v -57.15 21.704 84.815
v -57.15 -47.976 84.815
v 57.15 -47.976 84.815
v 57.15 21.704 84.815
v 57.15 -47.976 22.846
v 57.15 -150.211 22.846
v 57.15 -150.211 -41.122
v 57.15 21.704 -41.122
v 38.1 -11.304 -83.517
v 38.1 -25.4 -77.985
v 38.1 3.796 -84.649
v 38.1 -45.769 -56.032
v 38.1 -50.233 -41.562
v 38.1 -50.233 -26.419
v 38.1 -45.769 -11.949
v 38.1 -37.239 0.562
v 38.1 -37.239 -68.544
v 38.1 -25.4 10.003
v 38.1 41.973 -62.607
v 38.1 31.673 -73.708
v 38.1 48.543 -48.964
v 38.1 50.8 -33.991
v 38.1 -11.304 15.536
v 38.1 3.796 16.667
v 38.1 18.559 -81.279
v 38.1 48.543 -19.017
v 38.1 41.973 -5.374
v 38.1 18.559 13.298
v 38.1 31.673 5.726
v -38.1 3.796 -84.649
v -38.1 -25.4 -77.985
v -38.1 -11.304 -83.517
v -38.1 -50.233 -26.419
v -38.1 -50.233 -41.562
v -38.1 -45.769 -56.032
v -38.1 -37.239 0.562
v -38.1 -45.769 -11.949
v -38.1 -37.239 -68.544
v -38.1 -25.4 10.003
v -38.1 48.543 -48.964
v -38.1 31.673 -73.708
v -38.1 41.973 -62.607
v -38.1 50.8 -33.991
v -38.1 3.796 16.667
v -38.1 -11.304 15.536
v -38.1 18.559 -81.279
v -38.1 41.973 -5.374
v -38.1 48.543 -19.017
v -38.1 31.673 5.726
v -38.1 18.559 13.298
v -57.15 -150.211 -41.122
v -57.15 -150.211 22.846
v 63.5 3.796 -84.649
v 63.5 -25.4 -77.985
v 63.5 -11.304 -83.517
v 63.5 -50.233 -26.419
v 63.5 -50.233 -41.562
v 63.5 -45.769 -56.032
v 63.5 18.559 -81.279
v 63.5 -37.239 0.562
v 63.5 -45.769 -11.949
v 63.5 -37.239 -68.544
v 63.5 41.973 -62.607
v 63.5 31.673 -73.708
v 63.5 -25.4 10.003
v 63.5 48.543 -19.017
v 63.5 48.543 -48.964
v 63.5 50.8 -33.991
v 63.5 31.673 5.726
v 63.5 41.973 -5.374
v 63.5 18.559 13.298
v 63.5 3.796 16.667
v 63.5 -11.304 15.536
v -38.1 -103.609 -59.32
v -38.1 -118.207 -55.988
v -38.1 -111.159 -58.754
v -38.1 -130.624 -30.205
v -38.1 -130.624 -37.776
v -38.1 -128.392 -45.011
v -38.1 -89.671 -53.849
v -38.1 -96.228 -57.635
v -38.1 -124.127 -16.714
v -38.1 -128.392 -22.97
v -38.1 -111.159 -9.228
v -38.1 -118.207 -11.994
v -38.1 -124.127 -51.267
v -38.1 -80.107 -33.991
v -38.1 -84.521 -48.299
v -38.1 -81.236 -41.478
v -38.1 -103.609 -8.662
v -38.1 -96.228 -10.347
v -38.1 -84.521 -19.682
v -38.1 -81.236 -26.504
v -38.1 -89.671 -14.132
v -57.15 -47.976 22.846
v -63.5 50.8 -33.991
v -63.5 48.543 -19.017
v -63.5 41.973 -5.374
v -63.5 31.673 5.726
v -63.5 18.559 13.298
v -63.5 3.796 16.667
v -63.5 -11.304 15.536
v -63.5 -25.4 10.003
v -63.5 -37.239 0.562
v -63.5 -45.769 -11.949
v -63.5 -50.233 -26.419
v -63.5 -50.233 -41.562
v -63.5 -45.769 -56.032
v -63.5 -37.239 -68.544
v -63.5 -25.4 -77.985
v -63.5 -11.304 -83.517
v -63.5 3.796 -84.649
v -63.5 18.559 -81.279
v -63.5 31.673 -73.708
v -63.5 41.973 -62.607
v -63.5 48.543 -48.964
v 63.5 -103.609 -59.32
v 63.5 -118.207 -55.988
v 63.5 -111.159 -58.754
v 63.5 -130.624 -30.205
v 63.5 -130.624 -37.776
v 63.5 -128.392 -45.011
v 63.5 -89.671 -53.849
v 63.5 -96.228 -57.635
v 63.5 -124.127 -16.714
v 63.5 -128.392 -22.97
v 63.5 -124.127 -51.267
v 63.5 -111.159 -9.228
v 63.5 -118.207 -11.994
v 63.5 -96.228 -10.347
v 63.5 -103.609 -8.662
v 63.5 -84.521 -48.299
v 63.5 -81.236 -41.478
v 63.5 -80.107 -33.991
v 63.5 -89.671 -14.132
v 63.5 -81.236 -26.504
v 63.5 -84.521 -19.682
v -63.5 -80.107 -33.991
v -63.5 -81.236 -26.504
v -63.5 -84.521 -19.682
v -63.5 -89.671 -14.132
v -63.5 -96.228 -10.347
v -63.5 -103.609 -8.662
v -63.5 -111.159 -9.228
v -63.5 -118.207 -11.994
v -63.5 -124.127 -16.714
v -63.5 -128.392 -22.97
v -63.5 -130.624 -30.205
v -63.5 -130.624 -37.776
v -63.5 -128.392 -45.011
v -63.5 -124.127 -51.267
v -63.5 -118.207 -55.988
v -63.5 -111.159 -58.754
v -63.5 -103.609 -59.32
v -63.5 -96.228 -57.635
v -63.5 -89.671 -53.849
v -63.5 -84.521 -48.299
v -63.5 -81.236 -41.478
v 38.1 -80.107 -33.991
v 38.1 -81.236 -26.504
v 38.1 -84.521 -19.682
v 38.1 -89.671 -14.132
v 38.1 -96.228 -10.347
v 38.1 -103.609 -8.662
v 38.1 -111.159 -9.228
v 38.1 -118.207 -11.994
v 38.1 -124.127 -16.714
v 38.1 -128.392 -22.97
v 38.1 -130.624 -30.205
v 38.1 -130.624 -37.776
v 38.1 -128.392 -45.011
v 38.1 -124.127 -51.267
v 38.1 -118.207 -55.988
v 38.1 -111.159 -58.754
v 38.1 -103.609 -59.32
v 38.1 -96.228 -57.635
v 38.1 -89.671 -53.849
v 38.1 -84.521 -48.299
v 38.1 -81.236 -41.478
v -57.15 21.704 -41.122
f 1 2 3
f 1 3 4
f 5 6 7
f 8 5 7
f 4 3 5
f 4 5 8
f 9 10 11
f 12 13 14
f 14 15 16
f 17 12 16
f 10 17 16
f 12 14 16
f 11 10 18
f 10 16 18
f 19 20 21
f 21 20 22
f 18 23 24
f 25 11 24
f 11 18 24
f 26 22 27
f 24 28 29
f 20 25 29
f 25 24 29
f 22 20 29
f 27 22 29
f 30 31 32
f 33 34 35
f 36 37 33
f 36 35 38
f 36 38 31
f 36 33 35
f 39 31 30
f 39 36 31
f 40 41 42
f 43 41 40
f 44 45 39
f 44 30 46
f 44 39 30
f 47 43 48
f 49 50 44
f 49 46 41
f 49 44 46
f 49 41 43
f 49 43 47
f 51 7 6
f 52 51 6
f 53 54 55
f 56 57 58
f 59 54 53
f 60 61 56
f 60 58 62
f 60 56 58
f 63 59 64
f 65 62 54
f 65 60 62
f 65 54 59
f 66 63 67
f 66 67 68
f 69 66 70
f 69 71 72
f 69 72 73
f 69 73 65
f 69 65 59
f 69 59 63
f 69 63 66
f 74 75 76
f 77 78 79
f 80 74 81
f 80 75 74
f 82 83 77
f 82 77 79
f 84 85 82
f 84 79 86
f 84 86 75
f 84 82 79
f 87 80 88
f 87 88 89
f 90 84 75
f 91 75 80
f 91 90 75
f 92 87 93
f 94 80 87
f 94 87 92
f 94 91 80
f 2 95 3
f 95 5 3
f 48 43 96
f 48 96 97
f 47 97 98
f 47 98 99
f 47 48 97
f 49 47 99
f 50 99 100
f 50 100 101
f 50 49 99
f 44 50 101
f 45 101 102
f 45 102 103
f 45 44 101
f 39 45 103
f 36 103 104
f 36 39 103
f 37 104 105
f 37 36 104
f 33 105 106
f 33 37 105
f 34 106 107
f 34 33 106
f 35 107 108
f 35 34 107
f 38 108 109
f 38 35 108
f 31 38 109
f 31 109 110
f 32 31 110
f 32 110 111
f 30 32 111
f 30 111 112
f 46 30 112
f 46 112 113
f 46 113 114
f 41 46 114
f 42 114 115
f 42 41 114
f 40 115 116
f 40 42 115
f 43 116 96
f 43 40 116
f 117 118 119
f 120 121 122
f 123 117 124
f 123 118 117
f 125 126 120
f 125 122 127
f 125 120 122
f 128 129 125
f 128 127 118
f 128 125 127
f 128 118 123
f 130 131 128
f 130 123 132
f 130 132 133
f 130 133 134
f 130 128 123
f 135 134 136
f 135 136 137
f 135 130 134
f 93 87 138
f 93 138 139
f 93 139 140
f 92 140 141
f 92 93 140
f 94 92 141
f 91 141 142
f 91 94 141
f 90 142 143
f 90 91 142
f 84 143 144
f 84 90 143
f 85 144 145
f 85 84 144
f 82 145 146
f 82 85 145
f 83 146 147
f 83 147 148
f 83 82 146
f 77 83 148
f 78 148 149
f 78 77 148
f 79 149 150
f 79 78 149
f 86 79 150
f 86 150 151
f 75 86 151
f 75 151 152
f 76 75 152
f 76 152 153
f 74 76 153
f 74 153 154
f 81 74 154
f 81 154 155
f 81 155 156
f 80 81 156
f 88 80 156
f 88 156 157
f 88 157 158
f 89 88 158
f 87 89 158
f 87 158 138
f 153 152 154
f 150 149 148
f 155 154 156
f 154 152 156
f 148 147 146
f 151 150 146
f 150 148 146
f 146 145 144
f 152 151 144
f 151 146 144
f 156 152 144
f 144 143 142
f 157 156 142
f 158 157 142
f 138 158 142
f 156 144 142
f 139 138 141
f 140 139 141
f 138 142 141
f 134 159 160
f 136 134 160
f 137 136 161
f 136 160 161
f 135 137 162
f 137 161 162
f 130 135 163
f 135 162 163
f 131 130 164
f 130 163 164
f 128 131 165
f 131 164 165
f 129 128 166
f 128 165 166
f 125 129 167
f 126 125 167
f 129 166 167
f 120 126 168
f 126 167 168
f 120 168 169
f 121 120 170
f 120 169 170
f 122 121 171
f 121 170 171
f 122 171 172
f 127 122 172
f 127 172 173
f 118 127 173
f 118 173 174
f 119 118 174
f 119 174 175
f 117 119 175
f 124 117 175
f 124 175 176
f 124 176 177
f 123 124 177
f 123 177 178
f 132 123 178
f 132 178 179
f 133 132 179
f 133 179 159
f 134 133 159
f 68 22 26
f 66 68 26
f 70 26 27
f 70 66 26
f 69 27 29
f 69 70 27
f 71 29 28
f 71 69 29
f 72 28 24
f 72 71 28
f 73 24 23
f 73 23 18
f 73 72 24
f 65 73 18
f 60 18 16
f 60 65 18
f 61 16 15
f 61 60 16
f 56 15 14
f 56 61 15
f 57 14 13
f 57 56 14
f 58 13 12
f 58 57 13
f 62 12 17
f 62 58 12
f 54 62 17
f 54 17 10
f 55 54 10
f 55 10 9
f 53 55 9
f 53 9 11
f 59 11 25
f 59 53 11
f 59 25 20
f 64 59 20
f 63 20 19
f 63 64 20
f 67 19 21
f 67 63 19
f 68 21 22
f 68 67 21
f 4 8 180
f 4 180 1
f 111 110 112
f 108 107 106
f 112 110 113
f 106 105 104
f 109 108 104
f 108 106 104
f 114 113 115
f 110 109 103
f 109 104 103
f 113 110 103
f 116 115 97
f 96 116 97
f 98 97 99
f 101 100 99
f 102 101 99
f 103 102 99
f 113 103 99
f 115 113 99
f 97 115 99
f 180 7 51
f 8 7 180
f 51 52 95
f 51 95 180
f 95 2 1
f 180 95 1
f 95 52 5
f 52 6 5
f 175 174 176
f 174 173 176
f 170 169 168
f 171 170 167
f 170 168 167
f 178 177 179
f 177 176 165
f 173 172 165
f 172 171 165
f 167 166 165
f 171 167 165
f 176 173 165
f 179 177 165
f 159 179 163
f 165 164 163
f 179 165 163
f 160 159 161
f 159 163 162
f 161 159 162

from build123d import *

# Parameters (mm, degrees)
F0_R     = 25.4
F0_R_2   = 50.8
F1_DEPTH = 63.5
F2_R     = 33.275036
F2_R_2   = 69.67622
F3_DEPTH = 38.1
F4_W     = 102.235023
F4_H     = 63.968282
F4_W_2   = 69.679732
F4_H_2   = 61.969269
F5_DEPTH = 57.15


with BuildPart() as f1:
    # F0 (on Right) → F1 (new body, symmetric)
    with BuildSketch(Plane.YZ):
        with Locations((-105.507319, -33.990762)):
            Circle(F0_R)
        with Locations((0, -33.990762)):
            Circle(F0_R_2)
    extrude(amount=F1_DEPTH, both=True)

    # F2 (on Right) → F3 (cut, symmetric)
    with BuildSketch(Plane.YZ):
        with Locations((-106.233031, -35.125438)):
            Circle(F2_R)
        with Locations((0, -38.266737)):
            Circle(F2_R_2)
    extrude(amount=F3_DEPTH, both=True, mode=Mode.SUBTRACT)


with BuildPart() as f5:
    # F4 (on Right) → F5 (new body, symmetric)
    with BuildSketch(Plane.YZ):
        with Locations((-99.093718, -9.138325)):
            Rectangle(F4_W, F4_H)
        with Locations((-13.136341, 53.83045)):
            Rectangle(F4_W_2, F4_H_2)
        with Locations((-13.136341, -9.138325)):
            Rectangle(F4_W_2, F4_H)
    extrude(amount=F5_DEPTH, both=True)


solid = Compound([f1.part, f5.part])
